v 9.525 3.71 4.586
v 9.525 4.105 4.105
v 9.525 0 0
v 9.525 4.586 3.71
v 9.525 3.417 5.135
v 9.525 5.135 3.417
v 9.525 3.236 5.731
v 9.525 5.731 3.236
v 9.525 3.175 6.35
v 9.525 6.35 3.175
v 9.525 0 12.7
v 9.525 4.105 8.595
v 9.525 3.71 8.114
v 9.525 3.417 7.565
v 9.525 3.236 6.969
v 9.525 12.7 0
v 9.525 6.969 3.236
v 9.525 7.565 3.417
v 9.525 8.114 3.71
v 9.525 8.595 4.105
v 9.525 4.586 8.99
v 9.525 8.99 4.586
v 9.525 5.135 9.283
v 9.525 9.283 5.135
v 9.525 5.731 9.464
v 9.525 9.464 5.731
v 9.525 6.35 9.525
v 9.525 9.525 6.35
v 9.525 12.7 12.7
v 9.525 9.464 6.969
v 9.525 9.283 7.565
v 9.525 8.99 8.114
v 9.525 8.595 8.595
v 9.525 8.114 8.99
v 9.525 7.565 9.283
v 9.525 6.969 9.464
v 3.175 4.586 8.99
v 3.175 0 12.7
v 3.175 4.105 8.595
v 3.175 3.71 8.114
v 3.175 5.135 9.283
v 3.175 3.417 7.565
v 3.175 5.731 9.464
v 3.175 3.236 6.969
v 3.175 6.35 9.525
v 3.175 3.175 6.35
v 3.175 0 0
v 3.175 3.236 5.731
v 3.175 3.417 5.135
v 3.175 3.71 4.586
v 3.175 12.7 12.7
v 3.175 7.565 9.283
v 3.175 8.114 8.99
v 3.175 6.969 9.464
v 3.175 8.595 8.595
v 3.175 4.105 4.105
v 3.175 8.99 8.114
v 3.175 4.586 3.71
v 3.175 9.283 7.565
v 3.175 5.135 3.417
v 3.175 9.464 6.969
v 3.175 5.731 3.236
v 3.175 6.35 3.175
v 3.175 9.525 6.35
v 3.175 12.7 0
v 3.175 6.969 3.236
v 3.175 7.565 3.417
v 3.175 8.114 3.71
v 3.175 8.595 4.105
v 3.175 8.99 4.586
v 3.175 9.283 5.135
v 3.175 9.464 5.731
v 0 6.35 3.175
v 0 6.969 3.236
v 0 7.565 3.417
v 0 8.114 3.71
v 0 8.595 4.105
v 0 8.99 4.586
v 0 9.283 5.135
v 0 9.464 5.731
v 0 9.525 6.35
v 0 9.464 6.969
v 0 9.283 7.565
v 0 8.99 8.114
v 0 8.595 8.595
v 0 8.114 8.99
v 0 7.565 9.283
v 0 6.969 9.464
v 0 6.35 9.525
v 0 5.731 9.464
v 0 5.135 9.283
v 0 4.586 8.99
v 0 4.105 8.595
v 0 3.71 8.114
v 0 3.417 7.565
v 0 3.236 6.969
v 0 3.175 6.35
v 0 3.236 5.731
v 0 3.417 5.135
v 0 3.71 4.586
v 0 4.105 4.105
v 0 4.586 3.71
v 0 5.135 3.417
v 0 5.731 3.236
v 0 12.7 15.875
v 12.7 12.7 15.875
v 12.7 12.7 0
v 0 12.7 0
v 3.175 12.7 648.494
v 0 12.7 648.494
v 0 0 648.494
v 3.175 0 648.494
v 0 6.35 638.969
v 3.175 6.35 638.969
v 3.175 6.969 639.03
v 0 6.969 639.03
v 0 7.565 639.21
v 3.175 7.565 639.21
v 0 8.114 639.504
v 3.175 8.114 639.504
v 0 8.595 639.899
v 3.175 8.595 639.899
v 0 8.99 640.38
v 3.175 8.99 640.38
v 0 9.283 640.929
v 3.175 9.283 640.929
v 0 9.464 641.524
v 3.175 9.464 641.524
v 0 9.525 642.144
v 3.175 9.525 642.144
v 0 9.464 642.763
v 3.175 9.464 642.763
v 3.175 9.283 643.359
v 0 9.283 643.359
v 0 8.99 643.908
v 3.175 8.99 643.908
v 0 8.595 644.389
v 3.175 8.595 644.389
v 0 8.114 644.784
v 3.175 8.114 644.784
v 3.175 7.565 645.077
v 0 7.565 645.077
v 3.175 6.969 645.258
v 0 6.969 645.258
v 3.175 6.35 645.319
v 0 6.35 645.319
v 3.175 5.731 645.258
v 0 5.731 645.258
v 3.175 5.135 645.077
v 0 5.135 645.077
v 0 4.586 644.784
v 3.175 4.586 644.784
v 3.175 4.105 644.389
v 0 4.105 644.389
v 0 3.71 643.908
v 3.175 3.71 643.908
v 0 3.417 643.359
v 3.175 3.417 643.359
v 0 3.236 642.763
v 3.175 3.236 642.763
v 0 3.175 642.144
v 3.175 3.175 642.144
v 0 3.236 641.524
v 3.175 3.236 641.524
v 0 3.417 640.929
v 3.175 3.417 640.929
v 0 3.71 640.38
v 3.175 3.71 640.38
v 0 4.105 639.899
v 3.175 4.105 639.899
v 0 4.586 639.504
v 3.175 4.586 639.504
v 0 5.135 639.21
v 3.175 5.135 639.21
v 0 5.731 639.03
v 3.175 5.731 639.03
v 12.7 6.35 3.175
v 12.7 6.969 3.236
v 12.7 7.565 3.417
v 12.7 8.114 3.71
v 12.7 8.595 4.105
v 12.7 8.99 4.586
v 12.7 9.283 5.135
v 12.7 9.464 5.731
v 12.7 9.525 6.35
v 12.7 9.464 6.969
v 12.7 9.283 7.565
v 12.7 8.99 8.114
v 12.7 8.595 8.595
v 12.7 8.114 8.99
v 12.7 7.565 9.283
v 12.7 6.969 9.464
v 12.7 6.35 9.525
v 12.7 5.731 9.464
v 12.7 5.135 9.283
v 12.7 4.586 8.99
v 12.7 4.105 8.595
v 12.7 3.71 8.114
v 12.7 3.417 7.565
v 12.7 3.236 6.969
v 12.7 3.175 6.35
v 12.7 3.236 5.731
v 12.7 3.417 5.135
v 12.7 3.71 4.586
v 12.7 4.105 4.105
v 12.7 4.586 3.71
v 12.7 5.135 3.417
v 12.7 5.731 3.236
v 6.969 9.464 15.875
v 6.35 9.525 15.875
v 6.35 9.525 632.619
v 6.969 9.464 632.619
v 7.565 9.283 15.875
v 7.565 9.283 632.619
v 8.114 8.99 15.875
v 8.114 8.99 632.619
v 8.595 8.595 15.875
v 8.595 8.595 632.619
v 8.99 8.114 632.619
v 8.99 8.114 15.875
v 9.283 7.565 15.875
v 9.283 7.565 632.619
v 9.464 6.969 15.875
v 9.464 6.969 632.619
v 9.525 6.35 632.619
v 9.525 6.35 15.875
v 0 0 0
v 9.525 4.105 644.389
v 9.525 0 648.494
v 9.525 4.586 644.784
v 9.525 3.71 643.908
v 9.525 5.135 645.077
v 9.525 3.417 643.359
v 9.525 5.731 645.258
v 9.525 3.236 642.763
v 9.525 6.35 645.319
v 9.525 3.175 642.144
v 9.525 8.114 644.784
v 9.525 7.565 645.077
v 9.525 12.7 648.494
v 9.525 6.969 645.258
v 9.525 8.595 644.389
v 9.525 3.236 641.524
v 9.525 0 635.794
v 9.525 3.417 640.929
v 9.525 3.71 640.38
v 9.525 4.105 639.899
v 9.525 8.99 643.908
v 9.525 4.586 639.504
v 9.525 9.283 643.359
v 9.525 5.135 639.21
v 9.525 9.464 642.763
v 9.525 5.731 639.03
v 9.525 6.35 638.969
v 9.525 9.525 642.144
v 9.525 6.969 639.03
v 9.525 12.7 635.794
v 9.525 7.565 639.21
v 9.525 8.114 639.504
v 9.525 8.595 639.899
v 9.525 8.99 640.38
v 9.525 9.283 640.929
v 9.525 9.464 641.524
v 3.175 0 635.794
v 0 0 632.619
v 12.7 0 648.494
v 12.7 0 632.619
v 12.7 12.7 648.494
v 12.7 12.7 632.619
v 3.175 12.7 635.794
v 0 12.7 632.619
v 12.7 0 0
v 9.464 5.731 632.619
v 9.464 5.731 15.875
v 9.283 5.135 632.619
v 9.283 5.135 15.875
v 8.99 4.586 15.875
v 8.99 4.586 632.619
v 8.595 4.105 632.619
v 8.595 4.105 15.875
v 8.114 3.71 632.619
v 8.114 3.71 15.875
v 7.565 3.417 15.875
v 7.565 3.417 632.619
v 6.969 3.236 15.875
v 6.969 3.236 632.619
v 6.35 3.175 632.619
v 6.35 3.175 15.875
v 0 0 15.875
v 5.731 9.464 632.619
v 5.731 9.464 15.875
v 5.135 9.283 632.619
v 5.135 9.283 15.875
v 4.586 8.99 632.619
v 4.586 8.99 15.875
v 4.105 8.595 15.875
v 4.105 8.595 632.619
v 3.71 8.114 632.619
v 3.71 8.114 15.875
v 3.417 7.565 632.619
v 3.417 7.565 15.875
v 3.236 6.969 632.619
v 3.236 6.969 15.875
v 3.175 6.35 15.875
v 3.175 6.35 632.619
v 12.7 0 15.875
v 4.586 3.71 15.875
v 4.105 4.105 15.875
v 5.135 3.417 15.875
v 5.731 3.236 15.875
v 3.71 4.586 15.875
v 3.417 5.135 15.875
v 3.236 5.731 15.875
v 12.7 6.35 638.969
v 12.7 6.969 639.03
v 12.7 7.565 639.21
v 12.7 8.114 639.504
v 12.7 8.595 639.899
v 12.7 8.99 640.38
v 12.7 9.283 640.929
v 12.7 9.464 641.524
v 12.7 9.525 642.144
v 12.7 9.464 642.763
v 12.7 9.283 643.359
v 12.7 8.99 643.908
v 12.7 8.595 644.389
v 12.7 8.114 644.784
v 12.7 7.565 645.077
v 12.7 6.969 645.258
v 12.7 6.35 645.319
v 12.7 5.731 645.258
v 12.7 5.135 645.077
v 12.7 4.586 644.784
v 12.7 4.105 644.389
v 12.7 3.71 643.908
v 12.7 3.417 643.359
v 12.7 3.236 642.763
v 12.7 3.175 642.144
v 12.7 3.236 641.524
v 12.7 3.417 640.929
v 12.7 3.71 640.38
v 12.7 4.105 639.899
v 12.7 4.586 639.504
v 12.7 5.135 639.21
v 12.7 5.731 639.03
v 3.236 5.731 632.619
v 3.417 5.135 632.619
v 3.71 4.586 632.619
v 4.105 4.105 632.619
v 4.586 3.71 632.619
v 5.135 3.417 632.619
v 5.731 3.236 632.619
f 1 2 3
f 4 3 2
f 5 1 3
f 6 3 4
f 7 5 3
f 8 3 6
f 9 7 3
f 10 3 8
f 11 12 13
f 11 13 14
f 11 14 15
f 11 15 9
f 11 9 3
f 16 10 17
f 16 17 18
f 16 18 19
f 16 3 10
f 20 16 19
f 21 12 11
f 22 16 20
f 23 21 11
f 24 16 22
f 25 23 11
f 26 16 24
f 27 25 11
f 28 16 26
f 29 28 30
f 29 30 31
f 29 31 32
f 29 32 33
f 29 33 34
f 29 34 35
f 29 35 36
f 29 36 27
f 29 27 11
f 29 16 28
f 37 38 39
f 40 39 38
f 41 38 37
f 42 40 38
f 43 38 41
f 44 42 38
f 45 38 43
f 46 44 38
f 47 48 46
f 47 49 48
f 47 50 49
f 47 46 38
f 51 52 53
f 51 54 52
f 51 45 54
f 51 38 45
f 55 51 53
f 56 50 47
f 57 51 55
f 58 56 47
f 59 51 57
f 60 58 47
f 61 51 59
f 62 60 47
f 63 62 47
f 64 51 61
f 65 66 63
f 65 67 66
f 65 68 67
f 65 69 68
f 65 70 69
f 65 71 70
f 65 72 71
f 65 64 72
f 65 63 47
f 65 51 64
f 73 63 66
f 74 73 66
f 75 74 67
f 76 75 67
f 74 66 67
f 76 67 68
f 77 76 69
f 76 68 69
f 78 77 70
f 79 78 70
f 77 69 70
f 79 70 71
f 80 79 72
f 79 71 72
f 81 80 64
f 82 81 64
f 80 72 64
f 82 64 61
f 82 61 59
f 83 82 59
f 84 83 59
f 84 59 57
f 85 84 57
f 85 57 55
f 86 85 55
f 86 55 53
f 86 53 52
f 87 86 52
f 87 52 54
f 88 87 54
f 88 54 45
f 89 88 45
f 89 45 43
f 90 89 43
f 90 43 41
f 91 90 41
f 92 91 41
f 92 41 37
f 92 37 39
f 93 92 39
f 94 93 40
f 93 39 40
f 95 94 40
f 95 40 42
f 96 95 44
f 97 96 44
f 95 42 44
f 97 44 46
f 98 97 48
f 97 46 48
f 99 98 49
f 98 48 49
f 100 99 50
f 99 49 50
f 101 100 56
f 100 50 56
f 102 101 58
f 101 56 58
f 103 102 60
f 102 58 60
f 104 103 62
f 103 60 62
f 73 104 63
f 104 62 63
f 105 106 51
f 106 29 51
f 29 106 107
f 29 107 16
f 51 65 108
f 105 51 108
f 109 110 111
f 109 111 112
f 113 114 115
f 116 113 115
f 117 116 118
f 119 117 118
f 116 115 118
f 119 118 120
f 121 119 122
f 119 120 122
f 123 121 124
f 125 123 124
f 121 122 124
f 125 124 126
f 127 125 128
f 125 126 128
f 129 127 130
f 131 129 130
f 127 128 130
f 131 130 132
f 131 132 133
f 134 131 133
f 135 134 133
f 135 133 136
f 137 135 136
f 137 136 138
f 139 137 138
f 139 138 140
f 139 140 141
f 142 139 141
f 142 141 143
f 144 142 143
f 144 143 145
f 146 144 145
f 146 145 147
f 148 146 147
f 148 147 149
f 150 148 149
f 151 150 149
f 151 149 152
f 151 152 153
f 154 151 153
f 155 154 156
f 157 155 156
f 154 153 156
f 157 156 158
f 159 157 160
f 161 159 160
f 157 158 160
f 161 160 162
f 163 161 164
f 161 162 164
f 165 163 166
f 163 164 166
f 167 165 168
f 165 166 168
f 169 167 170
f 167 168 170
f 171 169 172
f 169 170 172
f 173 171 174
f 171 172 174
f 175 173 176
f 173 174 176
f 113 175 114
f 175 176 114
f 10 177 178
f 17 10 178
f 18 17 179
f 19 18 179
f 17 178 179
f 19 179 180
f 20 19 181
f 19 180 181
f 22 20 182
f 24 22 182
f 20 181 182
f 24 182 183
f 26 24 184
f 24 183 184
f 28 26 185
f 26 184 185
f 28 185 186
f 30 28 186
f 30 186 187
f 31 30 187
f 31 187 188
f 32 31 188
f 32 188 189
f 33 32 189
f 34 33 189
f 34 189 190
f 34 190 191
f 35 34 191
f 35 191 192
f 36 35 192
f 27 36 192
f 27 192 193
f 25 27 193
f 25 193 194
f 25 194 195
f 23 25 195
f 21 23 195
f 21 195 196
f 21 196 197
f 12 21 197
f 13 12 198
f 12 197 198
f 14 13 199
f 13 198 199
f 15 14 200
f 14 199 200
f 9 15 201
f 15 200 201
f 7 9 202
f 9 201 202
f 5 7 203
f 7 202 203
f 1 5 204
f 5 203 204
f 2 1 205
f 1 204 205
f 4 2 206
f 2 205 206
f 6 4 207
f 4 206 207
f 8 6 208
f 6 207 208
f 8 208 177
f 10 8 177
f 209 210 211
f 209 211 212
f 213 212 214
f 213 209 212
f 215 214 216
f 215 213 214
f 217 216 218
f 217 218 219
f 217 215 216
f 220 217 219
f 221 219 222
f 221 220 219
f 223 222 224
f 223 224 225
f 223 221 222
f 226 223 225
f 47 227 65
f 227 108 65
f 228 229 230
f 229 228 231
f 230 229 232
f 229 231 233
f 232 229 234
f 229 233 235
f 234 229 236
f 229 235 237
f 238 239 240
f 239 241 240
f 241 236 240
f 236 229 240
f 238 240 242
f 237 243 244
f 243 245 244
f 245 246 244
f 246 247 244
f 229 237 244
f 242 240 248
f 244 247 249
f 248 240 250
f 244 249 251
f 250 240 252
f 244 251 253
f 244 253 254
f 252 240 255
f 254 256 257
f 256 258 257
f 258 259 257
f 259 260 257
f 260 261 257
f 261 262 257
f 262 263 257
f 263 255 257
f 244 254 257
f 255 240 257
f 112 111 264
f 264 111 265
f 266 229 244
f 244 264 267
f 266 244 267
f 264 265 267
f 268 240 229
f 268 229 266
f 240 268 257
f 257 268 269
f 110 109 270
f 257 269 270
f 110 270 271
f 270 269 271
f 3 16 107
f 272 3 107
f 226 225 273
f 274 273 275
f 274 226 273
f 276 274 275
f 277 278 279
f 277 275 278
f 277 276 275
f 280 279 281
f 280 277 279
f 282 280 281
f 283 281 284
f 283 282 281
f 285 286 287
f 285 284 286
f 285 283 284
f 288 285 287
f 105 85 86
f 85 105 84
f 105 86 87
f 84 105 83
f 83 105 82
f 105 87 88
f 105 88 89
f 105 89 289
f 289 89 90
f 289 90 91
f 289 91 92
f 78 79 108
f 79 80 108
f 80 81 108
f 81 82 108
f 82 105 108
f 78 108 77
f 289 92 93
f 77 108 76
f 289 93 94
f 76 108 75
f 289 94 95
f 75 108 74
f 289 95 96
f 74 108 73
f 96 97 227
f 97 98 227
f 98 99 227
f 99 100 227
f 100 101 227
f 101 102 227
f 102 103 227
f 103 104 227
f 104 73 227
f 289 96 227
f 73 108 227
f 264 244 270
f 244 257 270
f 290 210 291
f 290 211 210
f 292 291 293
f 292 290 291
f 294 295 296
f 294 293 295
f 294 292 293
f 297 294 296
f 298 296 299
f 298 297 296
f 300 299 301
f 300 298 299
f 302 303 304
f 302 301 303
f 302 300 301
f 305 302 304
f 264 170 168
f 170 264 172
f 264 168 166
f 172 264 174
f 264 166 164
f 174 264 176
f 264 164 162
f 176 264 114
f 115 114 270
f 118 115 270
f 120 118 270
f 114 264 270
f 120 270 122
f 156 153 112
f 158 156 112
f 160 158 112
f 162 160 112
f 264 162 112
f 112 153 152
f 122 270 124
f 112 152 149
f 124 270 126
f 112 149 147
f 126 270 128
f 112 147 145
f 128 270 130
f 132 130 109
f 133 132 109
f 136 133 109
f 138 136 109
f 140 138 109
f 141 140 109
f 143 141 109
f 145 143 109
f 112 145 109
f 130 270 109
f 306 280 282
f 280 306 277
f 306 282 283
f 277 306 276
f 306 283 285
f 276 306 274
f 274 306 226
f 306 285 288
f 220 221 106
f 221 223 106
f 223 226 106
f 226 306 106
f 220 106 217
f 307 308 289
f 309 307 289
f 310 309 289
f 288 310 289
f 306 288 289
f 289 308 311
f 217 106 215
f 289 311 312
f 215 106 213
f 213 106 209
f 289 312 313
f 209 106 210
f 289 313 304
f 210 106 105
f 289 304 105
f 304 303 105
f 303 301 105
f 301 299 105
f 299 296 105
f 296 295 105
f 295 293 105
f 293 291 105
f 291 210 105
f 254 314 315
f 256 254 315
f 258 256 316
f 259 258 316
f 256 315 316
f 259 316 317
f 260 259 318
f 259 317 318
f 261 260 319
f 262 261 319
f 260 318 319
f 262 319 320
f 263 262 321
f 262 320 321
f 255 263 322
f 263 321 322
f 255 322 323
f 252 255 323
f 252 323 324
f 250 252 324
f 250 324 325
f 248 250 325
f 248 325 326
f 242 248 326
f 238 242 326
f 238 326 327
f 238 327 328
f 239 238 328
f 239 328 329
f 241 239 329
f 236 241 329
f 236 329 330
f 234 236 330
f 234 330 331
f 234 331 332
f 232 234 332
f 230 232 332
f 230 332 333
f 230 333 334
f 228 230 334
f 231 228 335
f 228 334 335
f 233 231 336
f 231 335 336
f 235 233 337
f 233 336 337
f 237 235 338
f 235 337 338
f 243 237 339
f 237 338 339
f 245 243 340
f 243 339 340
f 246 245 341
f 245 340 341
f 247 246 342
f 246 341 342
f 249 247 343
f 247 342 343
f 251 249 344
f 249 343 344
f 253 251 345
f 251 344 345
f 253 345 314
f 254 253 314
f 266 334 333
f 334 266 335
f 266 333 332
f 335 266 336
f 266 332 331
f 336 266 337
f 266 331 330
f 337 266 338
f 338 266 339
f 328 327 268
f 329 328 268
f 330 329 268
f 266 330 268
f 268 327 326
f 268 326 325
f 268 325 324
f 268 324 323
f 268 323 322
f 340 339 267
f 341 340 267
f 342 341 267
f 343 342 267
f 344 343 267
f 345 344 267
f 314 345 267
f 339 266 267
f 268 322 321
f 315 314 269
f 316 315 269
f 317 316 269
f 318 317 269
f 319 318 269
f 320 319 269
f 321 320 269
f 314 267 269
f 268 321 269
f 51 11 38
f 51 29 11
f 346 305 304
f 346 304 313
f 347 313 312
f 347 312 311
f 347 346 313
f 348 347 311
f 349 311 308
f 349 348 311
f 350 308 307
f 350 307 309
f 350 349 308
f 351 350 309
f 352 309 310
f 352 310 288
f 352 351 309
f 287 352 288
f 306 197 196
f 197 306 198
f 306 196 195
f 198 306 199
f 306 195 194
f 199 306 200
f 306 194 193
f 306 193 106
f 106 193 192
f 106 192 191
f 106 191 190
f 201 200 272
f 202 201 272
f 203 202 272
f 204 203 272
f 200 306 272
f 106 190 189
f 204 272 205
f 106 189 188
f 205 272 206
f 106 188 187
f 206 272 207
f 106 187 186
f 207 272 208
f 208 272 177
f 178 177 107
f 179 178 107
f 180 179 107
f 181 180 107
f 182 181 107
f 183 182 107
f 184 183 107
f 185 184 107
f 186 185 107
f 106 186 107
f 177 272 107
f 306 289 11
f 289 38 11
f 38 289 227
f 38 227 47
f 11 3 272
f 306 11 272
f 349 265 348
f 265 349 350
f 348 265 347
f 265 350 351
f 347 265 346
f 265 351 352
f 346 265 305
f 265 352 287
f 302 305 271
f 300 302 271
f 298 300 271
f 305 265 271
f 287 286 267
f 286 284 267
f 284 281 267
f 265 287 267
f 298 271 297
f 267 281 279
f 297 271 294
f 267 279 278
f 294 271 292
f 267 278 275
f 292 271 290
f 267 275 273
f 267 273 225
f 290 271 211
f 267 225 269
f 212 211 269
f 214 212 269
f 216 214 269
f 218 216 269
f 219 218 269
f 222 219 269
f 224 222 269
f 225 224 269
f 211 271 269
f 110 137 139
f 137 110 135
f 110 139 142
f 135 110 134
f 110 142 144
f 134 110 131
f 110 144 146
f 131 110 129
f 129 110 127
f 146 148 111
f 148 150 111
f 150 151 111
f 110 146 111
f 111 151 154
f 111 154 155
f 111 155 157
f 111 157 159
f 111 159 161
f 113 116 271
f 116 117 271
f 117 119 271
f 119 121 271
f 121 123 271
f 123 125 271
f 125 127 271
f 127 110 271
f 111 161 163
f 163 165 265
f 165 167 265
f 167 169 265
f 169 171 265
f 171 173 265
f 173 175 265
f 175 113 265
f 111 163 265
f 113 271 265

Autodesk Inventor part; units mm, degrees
ref_plane "YZ Plane" through (0, 0, 0) normal (1, 0, 0) x (0, 1, 0)
ref_plane "XZ Plane" through (0, 0, 0) normal (0, 1, 0) x (-1, 0, 0)
ref_plane "XY Plane" through (0, 0, 0) normal (0, 0, 1) x (1, 0, 0)
sketch "Sketch1" plane through (0, 0, 0) normal (0, 0, 1) x (1, 0, 0)
  line L0 (0, 0) -> (12.7, 0)
  line L1 (12.7, 0) -> (12.7, 12.7)
  line L2 (12.7, 12.7) -> (0, 12.7)
  line L3 (0, 12.7) -> (0, 0)
  dimension "d0" = 12.7
  dimension "d1" = 12.7
extrude "Extrusion1" add sketch "Sketch1" along normal blind 648.4937
sketch "Sketch2" plane through (12.7, 12.7, 648.4937) normal (0, 1, 0) x (1, 0, 0)
  line L0 (-12.7, 0) -> (0, 0) projected
  line L1 (0, 648.4937) -> (0, 0) projected
  line L2 (0, 648.4937) -> (-12.7, 648.4937) projected
  line L3 (-12.7, 648.4937) -> (-12.7, 0) projected
  line L4 (-12.7, 15.875) -> (-9.525, 15.875)
  line L5 (-9.525, 15.875) -> (-9.525, 632.6187)
  line L6 (-9.525, 632.6187) -> (-12.7, 632.6187)
  line L7 (-12.7, 632.6187) -> (-12.7, 15.875)
  line L8 (0, 632.6187) -> (-3.175, 632.6187)
  line L9 (-3.175, 632.6187) -> (-3.175, 15.875)
  line L10 (-3.175, 15.875) -> (0, 15.875)
  line L11 (0, 15.875) -> (0, 632.6187)
  line L12 (-9.525, 648.4937) -> (-3.175, 648.4937)
  line L13 (-3.175, 648.4937) -> (-3.175, 635.7937)
  line L14 (-3.175, 635.7937) -> (-9.525, 635.7937)
  line L15 (-9.525, 635.7937) -> (-9.525, 648.4937)
  line L16 (-9.525, 0) -> (-3.175, 0)
  line L17 (-3.175, 0) -> (-3.175, 12.7)
  line L18 (-3.175, 12.7) -> (-9.525, 12.7)
  line L19 (-9.525, 12.7) -> (-9.525, 0)
  dimension "d4" = 15.875
  dimension "d5" = 6.35
  dimension "d6" = 15.875
  dimension "d7" = 12.7
  dimension "d8" = 12.7
extrude "Extrusion2" cut sketch "Sketch2" against normal through all contours L19 L18 L17 L0 | L3 L6 L5 L4 | L10 L9 L8 L1 | L2 L13 L14 L15
sketch "Sketch3" plane through (12.7, 0, 648.4937) normal (1, 0, 0) x (0, 0, -1)
  line L0 (15.875, 12.7) -> (0, 12.7) projected
  line L1 (0, 12.7) -> (0, 0) projected
  line L2 (632.6187, 12.7) -> (632.6187, 0) projected
  line L3 (648.4937, 0) -> (632.6187, 0) projected
  line L4 (648.4937, 0) -> (648.4937, 12.7) projected
  line L5 (648.4937, 12.7) -> (632.6187, 12.7) projected
  line L6 (632.6187, 0) -> (15.875, 0) projected
  line L7 (632.6187, 12.7) -> (632.6187, 0) projected
  line L8 (15.875, 12.7) -> (632.6187, 12.7) projected
  line L9 (15.875, 12.7) -> (15.875, 0) projected
  line L10 (15.875, 12.7) -> (632.6187, 12.7)
  line L11 (632.6187, 12.7) -> (632.6187, 9.525)
  line L12 (632.6187, 9.525) -> (15.875, 9.525)
  line L13 (15.875, 9.525) -> (15.875, 12.7)
  line L14 (632.6187, 3.175) -> (15.875, 3.175)
  line L15 (15.875, 3.175) -> (15.875, 0)
  line L16 (15.875, 0) -> (632.6187, 0)
  line L17 (632.6187, 0) -> (632.6187, 3.175)
  circle A0 centre (6.35, 6.35) radius 3.175
  circle A1 centre (642.1437, 6.35) radius 3.175
  point P0 (648.4937, 0)
  dimension "d11" = 6.35
  dimension "d12" = 6.35
  dimension "d13" = 6.35
  dimension "d14" = 6.35
  dimension "d15" = 3.175
  dimension "d16" = 6.35
  dimension "d17" = 6.35
  dimension "d18" = 6.35
extrude "Extrusion3" cut sketch "Sketch3" against normal through all contours L2 L12 L9 L8 | L2 L6 L9 L14 | A0 | A1
fillet "Fillet1" radius 3.175 4 edges at (9.525, 9.525, 324.2469) (3.175, 9.525, 324.2469) (3.175, 3.175, 324.2469) (9.525, 3.175, 324.2469)
equation "\"d1\" = d0"
equation "\"d13\" = d12"
equation "\"d17\" = d16"
equation "\"d18\" = d17"
properties part number "manipulator piston"
